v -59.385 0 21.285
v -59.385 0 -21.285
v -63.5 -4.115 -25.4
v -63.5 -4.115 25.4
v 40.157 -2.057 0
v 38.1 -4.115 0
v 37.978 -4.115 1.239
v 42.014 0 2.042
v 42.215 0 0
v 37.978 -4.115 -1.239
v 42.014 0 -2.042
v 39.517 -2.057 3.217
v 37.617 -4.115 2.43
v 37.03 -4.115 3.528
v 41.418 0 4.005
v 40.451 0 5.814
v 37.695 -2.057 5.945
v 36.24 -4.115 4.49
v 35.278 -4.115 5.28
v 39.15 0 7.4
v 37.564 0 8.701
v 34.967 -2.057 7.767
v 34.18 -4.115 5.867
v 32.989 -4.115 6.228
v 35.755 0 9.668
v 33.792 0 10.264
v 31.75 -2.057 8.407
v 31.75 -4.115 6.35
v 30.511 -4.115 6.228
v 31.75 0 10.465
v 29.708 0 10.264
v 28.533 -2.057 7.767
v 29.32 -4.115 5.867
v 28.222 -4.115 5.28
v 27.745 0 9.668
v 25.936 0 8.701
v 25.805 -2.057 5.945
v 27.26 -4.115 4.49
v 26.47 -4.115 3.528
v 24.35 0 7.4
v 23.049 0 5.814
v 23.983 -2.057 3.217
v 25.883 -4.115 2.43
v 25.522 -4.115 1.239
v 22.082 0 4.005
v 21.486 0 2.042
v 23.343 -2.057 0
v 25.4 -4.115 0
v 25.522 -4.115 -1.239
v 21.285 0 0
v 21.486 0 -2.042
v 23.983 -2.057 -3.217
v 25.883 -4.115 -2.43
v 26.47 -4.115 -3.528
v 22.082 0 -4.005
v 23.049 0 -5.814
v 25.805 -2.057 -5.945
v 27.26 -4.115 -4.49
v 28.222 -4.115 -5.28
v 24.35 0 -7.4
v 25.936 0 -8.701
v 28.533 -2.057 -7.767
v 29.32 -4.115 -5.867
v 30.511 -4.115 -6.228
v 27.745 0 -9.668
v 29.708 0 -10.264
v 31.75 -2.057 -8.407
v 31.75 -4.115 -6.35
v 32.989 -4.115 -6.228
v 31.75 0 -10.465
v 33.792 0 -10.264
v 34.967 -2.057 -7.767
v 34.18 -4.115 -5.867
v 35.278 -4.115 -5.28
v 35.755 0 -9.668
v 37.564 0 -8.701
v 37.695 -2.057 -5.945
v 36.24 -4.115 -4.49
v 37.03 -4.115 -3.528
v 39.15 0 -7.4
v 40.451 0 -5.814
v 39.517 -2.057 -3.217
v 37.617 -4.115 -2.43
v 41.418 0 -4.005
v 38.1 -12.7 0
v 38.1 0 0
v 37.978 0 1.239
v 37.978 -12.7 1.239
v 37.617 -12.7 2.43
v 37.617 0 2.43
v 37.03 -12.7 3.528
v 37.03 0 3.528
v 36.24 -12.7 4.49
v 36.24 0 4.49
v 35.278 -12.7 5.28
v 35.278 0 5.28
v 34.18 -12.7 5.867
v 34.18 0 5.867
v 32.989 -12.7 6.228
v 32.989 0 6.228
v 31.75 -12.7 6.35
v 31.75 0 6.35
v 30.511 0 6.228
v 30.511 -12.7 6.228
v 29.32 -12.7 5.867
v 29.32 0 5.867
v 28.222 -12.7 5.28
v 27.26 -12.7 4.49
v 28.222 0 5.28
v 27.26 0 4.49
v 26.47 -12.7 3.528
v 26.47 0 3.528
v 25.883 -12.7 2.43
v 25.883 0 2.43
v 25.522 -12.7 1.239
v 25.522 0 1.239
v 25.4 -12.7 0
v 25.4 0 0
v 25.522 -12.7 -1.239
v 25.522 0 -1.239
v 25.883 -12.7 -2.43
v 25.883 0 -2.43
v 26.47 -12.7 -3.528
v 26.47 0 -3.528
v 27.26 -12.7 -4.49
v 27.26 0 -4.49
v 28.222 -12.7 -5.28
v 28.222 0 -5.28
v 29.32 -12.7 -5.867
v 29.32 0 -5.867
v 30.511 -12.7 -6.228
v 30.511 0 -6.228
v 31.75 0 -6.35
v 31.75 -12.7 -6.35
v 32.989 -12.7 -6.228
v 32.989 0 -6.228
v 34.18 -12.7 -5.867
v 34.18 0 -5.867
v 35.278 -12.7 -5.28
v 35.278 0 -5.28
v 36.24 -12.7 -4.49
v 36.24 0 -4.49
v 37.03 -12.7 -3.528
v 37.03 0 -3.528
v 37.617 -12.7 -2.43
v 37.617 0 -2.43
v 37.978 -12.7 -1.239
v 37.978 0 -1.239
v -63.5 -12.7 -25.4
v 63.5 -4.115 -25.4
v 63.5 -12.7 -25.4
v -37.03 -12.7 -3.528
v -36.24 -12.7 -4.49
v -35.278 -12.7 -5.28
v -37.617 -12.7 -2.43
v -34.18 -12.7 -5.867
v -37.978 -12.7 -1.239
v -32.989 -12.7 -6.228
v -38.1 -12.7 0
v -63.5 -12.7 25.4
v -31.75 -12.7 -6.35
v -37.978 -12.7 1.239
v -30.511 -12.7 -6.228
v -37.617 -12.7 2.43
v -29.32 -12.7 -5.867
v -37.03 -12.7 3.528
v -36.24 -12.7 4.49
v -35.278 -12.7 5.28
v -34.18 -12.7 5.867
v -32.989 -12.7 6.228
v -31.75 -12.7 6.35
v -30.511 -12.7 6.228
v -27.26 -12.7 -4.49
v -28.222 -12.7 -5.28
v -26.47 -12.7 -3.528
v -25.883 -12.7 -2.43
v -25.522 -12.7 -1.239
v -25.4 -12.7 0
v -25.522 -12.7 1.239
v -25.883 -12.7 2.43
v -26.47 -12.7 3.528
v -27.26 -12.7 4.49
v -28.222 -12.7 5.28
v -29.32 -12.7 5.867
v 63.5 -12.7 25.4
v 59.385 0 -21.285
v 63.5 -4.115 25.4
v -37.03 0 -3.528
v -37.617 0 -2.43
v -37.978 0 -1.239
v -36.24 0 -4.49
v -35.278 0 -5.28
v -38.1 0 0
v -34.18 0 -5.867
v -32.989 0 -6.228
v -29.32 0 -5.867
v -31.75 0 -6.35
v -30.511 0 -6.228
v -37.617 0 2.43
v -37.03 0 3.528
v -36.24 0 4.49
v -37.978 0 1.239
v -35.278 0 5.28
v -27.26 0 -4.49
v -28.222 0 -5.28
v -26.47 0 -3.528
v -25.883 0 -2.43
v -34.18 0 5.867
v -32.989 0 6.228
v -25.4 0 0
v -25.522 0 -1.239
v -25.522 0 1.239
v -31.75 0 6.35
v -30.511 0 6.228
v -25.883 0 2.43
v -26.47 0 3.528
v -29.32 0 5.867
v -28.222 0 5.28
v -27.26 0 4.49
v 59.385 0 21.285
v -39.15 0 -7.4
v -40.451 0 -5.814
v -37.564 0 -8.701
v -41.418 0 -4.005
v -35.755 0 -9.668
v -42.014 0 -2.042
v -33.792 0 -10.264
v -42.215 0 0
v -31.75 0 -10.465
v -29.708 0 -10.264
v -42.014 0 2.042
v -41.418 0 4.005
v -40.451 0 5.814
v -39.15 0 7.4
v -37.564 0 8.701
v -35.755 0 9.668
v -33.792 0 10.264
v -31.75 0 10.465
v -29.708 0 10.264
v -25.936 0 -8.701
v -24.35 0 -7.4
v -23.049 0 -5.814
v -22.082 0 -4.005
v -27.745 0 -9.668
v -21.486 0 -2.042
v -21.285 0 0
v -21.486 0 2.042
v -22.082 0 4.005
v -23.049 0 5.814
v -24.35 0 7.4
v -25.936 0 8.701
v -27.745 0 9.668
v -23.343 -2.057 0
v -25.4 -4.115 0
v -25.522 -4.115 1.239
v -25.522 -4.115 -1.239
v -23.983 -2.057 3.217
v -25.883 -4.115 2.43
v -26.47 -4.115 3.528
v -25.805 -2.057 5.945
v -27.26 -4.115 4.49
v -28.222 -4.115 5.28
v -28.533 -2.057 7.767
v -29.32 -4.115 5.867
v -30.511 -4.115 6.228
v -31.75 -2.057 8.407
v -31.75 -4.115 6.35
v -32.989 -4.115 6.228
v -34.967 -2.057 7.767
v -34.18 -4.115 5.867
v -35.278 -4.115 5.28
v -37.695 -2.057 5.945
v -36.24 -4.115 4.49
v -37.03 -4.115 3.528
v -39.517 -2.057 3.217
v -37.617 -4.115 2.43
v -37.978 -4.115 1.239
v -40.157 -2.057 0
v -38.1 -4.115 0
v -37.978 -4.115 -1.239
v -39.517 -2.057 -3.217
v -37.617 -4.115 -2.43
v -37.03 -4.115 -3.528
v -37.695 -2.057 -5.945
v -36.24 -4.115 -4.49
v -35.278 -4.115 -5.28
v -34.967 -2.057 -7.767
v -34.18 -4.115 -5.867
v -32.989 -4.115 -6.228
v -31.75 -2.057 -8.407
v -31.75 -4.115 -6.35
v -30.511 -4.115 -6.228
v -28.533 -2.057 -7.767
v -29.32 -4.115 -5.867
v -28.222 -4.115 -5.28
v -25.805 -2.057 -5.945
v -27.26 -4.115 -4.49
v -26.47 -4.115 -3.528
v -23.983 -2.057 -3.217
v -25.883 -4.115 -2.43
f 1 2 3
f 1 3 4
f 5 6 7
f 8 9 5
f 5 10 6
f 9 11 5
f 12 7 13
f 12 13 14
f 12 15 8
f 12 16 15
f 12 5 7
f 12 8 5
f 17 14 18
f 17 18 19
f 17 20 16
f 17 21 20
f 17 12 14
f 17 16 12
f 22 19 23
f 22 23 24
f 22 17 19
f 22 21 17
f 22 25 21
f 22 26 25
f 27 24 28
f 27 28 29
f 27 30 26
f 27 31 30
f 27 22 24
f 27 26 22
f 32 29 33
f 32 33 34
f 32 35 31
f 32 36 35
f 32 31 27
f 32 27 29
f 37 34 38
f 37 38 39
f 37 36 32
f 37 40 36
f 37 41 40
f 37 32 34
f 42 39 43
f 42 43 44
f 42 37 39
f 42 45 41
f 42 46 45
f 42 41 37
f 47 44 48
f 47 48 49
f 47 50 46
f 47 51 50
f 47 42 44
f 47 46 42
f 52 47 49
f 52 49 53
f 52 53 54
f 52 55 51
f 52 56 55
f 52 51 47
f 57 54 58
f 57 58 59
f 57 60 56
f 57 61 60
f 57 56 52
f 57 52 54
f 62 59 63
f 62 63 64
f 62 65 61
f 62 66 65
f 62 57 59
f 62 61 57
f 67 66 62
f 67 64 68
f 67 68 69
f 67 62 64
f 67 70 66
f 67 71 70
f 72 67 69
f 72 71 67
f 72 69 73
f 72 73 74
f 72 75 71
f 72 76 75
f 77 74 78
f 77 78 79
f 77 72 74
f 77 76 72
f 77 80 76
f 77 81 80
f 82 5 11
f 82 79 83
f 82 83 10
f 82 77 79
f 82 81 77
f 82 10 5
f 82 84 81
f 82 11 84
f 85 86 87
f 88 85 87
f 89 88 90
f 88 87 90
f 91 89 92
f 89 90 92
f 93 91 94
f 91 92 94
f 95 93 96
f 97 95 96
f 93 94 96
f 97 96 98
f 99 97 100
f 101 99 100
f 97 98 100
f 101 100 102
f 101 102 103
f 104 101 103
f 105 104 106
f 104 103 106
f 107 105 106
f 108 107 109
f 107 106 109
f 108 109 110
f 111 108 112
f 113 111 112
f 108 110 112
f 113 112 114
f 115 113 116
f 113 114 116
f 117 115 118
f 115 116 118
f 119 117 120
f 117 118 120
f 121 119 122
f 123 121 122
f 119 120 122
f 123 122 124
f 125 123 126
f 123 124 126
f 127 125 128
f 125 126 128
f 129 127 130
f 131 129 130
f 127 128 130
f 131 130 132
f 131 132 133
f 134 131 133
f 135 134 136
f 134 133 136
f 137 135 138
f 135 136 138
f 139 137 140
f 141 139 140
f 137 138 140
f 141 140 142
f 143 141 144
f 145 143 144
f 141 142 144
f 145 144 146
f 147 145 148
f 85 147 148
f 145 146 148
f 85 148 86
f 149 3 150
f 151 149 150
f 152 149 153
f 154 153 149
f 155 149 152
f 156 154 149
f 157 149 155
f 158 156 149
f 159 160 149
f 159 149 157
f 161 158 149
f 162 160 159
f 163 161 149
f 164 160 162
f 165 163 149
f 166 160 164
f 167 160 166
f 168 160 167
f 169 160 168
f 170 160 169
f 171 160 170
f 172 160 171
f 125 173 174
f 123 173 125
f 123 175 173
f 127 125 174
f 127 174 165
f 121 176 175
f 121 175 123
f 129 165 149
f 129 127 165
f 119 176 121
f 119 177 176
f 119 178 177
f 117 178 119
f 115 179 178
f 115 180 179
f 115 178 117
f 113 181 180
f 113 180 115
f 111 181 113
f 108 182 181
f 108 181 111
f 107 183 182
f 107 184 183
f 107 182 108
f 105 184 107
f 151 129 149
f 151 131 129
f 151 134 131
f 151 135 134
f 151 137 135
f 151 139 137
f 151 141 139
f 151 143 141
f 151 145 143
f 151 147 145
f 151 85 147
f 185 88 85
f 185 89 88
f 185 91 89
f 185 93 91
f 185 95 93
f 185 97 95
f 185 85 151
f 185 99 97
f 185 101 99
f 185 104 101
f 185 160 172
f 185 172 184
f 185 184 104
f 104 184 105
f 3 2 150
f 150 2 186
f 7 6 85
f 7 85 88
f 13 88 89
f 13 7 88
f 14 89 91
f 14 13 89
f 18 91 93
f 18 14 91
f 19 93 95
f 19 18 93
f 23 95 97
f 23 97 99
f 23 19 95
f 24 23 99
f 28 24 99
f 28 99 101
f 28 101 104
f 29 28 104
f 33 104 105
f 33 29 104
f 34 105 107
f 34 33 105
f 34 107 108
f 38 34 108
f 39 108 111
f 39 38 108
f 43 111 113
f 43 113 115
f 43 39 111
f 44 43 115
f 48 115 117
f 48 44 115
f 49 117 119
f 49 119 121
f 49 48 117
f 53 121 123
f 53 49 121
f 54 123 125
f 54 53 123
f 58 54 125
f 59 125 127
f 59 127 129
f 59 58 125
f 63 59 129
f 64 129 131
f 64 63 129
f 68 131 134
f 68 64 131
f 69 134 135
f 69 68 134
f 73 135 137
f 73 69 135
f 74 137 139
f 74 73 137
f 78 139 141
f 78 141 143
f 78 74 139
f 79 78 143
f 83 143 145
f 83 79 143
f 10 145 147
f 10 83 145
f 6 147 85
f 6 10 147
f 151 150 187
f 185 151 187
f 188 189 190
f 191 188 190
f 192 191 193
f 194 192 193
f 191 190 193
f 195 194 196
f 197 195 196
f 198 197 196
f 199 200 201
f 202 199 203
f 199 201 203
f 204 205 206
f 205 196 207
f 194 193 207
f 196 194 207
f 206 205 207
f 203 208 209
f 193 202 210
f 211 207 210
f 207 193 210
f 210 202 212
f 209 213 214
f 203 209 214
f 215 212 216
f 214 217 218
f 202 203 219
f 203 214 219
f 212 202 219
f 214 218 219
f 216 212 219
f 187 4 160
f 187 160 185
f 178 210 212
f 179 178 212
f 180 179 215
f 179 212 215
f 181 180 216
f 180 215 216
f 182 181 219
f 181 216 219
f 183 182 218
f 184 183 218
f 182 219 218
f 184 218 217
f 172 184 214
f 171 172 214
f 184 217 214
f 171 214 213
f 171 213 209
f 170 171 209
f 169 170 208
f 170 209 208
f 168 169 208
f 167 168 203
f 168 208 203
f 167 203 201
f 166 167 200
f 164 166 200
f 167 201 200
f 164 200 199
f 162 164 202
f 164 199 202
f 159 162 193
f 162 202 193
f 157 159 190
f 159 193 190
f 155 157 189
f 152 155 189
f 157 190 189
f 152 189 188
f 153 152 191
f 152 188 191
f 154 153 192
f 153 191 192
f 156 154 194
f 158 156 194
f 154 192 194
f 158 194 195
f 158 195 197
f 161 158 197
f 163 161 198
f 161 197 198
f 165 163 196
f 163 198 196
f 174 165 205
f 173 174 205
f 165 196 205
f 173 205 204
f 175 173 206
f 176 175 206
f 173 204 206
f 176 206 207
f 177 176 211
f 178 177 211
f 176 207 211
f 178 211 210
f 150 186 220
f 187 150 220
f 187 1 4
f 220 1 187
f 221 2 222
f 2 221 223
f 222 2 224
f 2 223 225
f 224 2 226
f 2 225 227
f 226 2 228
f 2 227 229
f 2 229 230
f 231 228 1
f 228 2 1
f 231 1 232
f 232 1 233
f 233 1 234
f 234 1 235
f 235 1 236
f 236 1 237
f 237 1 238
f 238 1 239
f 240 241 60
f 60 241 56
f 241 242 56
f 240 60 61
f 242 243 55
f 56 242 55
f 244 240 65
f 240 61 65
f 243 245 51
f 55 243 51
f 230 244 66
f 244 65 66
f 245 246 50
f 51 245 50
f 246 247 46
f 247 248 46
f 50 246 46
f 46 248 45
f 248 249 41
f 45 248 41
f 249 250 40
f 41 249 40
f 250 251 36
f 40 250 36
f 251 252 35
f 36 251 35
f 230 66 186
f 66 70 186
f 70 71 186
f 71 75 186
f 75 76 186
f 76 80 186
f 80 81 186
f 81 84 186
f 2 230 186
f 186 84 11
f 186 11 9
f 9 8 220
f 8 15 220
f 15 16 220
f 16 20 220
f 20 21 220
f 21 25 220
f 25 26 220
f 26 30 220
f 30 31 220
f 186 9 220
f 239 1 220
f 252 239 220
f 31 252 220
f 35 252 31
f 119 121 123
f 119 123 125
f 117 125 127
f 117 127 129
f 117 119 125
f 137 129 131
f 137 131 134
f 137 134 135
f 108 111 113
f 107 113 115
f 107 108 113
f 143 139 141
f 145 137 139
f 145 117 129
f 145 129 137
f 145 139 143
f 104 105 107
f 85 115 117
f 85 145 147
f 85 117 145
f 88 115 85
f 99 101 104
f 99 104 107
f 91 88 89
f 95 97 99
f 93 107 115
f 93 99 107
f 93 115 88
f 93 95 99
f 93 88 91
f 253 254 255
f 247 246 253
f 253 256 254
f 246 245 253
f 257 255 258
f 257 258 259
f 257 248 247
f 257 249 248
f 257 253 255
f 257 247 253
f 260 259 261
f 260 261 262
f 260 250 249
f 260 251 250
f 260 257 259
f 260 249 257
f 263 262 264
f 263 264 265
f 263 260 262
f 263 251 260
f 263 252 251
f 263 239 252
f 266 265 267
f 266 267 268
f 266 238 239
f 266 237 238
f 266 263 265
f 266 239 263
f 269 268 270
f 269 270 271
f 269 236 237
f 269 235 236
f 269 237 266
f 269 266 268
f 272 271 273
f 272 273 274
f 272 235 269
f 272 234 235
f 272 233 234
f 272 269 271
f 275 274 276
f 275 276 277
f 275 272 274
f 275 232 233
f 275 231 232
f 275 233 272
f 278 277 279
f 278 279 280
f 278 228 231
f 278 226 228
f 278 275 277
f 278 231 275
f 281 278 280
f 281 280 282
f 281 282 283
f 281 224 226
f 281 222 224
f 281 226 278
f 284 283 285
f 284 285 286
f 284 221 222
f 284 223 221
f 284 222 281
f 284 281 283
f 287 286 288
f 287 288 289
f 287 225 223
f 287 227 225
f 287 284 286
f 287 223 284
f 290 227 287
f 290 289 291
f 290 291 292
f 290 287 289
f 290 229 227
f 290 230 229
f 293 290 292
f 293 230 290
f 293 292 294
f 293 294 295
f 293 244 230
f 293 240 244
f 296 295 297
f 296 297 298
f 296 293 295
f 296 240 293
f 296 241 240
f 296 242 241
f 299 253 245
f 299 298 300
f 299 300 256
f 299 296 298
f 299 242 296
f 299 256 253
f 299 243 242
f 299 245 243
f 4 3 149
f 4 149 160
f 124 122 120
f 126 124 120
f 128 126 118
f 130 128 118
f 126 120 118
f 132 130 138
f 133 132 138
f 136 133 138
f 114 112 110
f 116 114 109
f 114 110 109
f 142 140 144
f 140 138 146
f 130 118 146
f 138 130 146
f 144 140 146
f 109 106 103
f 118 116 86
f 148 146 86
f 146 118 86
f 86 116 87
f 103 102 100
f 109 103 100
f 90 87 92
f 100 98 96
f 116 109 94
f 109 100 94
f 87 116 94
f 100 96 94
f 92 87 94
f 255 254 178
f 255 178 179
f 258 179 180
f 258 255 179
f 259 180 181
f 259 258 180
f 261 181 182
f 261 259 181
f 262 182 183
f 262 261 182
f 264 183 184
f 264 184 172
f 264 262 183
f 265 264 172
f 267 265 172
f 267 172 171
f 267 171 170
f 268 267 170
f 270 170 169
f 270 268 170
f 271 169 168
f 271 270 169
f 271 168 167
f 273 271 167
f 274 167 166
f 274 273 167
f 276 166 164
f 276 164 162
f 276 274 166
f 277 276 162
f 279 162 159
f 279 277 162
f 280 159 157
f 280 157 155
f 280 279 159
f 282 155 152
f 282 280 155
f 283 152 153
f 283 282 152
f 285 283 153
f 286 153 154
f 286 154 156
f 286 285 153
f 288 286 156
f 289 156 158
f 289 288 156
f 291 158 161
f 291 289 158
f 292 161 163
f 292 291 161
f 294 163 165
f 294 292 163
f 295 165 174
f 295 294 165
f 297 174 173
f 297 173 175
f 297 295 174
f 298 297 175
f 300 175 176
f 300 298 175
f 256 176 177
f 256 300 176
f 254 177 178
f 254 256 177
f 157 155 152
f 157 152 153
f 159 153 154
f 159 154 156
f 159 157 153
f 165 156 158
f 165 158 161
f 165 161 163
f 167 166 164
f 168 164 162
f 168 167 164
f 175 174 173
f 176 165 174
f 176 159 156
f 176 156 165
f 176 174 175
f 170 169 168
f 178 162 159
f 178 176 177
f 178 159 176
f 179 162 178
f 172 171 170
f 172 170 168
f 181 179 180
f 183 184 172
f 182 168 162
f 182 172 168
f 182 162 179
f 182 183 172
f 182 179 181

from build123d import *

# Parameters (mm, degrees)
F0_R     = 6.35
F1_DEPTH = 12.7
F0_W     = 127
F0_H     = 50.8
F2_DEPTH = 12.7
F3_SIZE  = 4.1148


with BuildPart() as f1:
    # F0 (on Front) → F1 (new body)
    with BuildSketch(Plane.XZ):
        with Locations((-31.75, 0)):
            Circle(F0_R)
    extrude(amount=F1_DEPTH)


with BuildPart() as f1b:
    # F0 (on Front) → F1, piece 2 (new body)
    with BuildSketch(Plane.XZ):
        with Locations((31.75, 0)):
            Circle(F0_R)
    extrude(amount=F1_DEPTH)


with BuildPart() as f2:
    # F0 (on Front) → F2 (new body)
    with BuildSketch(Plane.XZ):
        Rectangle(F0_W, F0_H)
        with Locations((-31.75, 0)):
            Circle(F0_R, mode=Mode.SUBTRACT)
        with Locations((31.75, 0)):
            Circle(F0_R, mode=Mode.SUBTRACT)
    extrude(amount=F2_DEPTH)

    # F3
    f3_edges = [f2.edges().sort_by_distance(p)[0] for p in [
        (63.5, 0, 0),
        (0, 0, 25.4),
        (-63.5, 0, 0),
        (0, 0, -25.4),
        (-38.1, 0, 0),
        (25.4, 0, 0),
    ]]
    chamfer(f3_edges, length=F3_SIZE)


solid = Compound([f1.part, f1b.part, f2.part])
